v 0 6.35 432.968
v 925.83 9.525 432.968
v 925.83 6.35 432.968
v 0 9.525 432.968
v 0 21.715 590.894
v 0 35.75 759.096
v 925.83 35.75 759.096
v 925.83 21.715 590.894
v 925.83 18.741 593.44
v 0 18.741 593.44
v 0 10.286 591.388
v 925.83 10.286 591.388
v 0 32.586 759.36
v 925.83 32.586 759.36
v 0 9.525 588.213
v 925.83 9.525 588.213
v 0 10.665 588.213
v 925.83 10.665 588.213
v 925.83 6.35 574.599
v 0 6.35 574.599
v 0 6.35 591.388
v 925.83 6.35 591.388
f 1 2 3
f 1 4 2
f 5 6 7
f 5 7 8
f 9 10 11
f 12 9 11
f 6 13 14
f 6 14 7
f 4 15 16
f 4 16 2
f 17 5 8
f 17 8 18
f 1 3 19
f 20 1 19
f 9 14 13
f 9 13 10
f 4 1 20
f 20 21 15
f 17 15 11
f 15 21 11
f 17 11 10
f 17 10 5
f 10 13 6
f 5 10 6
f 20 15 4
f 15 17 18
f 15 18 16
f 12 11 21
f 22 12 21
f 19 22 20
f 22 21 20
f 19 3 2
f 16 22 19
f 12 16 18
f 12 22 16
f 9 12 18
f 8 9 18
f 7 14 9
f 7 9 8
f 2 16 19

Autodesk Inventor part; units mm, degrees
ref_plane "YZ Plane" through (0, 0, 0) normal (1, 0, 0) x (0, 1, 0)
ref_plane "XZ Plane" through (0, 0, 0) normal (0, 1, 0) x (-1, 0, 0)
ref_plane "XY Plane" through (0, 0, 0) normal (0, 0, 1) x (1, 0, 0)
sketch "Sketch1" plane through (0, 0, 0) normal (1, 0, 0) x (0, 1, 0)
  line L0 (0, 0) -> (0, 597.7382)
  line L1 (0, 0) -> (3.175, 0)
  line L2 (3.175, 0) -> (3.175, 594.5632)
  line L3 (3.175, 594.5632) -> (9.906, 594.5632)
  line L4 (9.906, 594.5632) -> (15.756, 595.9828)
  line L5 (0, 597.7382) -> (9.5263, 597.7382)
  line L6 (9.5263, 597.7382) -> (12.7824, 598.5283)
  line L7 (41.2921, 902.0052) -> (15.756, 595.9828)
  line L8 (12.7824, 598.5283) -> (38.1281, 902.2692)
  line L9 (38.1281, 902.2692) -> (41.2921, 902.0052)
  line L10 (41.2921, 902.0052) -> (44.4671, 901.7403)
  line L11 (44.4671, 901.7403) -> (18.7409, 593.44)
  line L12 (18.7409, 593.44) -> (10.2857, 591.3882)
  line L13 (10.2857, 591.3882) -> (6.35, 591.3882)
  line L14 (6.35, 591.3882) -> (6.35, 574.5988)
  line L15 (6.35, 574.5988) -> (3.175, 574.5988)
  line L16 (44.4671, 901.7403) -> (47.6311, 901.4763)
  line L17 (47.6311, 901.4763) -> (21.7146, 590.8944)
  line L18 (21.7146, 590.8944) -> (10.6654, 588.2132)
  line L19 (10.6654, 588.2132) -> (9.525, 588.2132)
  line L20 (9.525, 588.2132) -> (9.525, 432.9684)
  line L21 (9.525, 432.9684) -> (6.35, 432.9684)
  line L22 (6.35, 432.9684) -> (6.35, 574.5988)
  line L23 (32.5862, 759.3601) -> (35.7502, 759.0961)
  point P0 (14.5133, 592.4141)
  dimension "d0" = 594.5632
  dimension "d1" = 3.175
  dimension "d2" = 6.731
  dimension "d7" = 3.175
  dimension "d8" = 6.0198
  dimension "d9" = 166.36
  dimension "d10" = 3.175
  dimension "d11" = 108.41
  dimension "d12" = 3.175
  dimension "d13" = 307.086
  dimension "d18" = 3.175
  dimension "d20" = 307.1025
  dimension "d21" = 8.7006
  dimension "d22" = 3.175
  dimension "d23" = 3.175
  dimension "d24" = 3.9357
  dimension "d25" = 16.7894
  dimension "d28" = 3.175
  dimension "d29" = 3.186
  dimension "d30" = 3.175
  dimension "d32" = 3.175
  dimension "d33" = 3.175
  dimension "d34" = 142.875
  dimension "d35" = 168.7862
  dimension "d36" = 11.3698
  dimension "d37" = 1.1404
  dimension "d38" = 155.2448
extrude "Extrusion3" add sketch "Sketch1" along normal blind 925.83 contours L14 L13 L12 L11 L23 L17 L18 L19 L20 L21 L22
properties part number "Second_Shingle_Over_Intake_Vent_With_Length_36.45_Inches"
